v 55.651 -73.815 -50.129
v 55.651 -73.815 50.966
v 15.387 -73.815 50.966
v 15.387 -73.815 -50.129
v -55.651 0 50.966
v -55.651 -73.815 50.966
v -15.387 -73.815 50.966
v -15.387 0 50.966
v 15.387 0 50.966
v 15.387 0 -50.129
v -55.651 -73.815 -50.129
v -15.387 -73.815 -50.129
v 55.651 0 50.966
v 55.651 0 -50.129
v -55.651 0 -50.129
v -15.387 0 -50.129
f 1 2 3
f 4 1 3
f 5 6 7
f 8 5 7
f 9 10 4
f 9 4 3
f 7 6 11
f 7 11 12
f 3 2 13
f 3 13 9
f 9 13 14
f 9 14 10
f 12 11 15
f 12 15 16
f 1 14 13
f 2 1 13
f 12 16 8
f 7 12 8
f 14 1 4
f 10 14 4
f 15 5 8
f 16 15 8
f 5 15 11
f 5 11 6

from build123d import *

# Parameters (mm, degrees)
F0_W     = 40.264076
F0_H     = 101.094407
F1_DEPTH = 73.814765


with BuildPart() as f1:
    # F0 (on Front) → F1 (new body)
    with BuildSketch(Plane.XZ):
        with Locations((-35.518863, 0.418452)):
            Rectangle(F0_W, F0_H)
    extrude(amount=F1_DEPTH)


with BuildPart() as f2_1:
    # F2: instance of F1
    add(f1.part.mirror(Plane.YZ))


solid = Compound([f1.part, f2_1.part])
